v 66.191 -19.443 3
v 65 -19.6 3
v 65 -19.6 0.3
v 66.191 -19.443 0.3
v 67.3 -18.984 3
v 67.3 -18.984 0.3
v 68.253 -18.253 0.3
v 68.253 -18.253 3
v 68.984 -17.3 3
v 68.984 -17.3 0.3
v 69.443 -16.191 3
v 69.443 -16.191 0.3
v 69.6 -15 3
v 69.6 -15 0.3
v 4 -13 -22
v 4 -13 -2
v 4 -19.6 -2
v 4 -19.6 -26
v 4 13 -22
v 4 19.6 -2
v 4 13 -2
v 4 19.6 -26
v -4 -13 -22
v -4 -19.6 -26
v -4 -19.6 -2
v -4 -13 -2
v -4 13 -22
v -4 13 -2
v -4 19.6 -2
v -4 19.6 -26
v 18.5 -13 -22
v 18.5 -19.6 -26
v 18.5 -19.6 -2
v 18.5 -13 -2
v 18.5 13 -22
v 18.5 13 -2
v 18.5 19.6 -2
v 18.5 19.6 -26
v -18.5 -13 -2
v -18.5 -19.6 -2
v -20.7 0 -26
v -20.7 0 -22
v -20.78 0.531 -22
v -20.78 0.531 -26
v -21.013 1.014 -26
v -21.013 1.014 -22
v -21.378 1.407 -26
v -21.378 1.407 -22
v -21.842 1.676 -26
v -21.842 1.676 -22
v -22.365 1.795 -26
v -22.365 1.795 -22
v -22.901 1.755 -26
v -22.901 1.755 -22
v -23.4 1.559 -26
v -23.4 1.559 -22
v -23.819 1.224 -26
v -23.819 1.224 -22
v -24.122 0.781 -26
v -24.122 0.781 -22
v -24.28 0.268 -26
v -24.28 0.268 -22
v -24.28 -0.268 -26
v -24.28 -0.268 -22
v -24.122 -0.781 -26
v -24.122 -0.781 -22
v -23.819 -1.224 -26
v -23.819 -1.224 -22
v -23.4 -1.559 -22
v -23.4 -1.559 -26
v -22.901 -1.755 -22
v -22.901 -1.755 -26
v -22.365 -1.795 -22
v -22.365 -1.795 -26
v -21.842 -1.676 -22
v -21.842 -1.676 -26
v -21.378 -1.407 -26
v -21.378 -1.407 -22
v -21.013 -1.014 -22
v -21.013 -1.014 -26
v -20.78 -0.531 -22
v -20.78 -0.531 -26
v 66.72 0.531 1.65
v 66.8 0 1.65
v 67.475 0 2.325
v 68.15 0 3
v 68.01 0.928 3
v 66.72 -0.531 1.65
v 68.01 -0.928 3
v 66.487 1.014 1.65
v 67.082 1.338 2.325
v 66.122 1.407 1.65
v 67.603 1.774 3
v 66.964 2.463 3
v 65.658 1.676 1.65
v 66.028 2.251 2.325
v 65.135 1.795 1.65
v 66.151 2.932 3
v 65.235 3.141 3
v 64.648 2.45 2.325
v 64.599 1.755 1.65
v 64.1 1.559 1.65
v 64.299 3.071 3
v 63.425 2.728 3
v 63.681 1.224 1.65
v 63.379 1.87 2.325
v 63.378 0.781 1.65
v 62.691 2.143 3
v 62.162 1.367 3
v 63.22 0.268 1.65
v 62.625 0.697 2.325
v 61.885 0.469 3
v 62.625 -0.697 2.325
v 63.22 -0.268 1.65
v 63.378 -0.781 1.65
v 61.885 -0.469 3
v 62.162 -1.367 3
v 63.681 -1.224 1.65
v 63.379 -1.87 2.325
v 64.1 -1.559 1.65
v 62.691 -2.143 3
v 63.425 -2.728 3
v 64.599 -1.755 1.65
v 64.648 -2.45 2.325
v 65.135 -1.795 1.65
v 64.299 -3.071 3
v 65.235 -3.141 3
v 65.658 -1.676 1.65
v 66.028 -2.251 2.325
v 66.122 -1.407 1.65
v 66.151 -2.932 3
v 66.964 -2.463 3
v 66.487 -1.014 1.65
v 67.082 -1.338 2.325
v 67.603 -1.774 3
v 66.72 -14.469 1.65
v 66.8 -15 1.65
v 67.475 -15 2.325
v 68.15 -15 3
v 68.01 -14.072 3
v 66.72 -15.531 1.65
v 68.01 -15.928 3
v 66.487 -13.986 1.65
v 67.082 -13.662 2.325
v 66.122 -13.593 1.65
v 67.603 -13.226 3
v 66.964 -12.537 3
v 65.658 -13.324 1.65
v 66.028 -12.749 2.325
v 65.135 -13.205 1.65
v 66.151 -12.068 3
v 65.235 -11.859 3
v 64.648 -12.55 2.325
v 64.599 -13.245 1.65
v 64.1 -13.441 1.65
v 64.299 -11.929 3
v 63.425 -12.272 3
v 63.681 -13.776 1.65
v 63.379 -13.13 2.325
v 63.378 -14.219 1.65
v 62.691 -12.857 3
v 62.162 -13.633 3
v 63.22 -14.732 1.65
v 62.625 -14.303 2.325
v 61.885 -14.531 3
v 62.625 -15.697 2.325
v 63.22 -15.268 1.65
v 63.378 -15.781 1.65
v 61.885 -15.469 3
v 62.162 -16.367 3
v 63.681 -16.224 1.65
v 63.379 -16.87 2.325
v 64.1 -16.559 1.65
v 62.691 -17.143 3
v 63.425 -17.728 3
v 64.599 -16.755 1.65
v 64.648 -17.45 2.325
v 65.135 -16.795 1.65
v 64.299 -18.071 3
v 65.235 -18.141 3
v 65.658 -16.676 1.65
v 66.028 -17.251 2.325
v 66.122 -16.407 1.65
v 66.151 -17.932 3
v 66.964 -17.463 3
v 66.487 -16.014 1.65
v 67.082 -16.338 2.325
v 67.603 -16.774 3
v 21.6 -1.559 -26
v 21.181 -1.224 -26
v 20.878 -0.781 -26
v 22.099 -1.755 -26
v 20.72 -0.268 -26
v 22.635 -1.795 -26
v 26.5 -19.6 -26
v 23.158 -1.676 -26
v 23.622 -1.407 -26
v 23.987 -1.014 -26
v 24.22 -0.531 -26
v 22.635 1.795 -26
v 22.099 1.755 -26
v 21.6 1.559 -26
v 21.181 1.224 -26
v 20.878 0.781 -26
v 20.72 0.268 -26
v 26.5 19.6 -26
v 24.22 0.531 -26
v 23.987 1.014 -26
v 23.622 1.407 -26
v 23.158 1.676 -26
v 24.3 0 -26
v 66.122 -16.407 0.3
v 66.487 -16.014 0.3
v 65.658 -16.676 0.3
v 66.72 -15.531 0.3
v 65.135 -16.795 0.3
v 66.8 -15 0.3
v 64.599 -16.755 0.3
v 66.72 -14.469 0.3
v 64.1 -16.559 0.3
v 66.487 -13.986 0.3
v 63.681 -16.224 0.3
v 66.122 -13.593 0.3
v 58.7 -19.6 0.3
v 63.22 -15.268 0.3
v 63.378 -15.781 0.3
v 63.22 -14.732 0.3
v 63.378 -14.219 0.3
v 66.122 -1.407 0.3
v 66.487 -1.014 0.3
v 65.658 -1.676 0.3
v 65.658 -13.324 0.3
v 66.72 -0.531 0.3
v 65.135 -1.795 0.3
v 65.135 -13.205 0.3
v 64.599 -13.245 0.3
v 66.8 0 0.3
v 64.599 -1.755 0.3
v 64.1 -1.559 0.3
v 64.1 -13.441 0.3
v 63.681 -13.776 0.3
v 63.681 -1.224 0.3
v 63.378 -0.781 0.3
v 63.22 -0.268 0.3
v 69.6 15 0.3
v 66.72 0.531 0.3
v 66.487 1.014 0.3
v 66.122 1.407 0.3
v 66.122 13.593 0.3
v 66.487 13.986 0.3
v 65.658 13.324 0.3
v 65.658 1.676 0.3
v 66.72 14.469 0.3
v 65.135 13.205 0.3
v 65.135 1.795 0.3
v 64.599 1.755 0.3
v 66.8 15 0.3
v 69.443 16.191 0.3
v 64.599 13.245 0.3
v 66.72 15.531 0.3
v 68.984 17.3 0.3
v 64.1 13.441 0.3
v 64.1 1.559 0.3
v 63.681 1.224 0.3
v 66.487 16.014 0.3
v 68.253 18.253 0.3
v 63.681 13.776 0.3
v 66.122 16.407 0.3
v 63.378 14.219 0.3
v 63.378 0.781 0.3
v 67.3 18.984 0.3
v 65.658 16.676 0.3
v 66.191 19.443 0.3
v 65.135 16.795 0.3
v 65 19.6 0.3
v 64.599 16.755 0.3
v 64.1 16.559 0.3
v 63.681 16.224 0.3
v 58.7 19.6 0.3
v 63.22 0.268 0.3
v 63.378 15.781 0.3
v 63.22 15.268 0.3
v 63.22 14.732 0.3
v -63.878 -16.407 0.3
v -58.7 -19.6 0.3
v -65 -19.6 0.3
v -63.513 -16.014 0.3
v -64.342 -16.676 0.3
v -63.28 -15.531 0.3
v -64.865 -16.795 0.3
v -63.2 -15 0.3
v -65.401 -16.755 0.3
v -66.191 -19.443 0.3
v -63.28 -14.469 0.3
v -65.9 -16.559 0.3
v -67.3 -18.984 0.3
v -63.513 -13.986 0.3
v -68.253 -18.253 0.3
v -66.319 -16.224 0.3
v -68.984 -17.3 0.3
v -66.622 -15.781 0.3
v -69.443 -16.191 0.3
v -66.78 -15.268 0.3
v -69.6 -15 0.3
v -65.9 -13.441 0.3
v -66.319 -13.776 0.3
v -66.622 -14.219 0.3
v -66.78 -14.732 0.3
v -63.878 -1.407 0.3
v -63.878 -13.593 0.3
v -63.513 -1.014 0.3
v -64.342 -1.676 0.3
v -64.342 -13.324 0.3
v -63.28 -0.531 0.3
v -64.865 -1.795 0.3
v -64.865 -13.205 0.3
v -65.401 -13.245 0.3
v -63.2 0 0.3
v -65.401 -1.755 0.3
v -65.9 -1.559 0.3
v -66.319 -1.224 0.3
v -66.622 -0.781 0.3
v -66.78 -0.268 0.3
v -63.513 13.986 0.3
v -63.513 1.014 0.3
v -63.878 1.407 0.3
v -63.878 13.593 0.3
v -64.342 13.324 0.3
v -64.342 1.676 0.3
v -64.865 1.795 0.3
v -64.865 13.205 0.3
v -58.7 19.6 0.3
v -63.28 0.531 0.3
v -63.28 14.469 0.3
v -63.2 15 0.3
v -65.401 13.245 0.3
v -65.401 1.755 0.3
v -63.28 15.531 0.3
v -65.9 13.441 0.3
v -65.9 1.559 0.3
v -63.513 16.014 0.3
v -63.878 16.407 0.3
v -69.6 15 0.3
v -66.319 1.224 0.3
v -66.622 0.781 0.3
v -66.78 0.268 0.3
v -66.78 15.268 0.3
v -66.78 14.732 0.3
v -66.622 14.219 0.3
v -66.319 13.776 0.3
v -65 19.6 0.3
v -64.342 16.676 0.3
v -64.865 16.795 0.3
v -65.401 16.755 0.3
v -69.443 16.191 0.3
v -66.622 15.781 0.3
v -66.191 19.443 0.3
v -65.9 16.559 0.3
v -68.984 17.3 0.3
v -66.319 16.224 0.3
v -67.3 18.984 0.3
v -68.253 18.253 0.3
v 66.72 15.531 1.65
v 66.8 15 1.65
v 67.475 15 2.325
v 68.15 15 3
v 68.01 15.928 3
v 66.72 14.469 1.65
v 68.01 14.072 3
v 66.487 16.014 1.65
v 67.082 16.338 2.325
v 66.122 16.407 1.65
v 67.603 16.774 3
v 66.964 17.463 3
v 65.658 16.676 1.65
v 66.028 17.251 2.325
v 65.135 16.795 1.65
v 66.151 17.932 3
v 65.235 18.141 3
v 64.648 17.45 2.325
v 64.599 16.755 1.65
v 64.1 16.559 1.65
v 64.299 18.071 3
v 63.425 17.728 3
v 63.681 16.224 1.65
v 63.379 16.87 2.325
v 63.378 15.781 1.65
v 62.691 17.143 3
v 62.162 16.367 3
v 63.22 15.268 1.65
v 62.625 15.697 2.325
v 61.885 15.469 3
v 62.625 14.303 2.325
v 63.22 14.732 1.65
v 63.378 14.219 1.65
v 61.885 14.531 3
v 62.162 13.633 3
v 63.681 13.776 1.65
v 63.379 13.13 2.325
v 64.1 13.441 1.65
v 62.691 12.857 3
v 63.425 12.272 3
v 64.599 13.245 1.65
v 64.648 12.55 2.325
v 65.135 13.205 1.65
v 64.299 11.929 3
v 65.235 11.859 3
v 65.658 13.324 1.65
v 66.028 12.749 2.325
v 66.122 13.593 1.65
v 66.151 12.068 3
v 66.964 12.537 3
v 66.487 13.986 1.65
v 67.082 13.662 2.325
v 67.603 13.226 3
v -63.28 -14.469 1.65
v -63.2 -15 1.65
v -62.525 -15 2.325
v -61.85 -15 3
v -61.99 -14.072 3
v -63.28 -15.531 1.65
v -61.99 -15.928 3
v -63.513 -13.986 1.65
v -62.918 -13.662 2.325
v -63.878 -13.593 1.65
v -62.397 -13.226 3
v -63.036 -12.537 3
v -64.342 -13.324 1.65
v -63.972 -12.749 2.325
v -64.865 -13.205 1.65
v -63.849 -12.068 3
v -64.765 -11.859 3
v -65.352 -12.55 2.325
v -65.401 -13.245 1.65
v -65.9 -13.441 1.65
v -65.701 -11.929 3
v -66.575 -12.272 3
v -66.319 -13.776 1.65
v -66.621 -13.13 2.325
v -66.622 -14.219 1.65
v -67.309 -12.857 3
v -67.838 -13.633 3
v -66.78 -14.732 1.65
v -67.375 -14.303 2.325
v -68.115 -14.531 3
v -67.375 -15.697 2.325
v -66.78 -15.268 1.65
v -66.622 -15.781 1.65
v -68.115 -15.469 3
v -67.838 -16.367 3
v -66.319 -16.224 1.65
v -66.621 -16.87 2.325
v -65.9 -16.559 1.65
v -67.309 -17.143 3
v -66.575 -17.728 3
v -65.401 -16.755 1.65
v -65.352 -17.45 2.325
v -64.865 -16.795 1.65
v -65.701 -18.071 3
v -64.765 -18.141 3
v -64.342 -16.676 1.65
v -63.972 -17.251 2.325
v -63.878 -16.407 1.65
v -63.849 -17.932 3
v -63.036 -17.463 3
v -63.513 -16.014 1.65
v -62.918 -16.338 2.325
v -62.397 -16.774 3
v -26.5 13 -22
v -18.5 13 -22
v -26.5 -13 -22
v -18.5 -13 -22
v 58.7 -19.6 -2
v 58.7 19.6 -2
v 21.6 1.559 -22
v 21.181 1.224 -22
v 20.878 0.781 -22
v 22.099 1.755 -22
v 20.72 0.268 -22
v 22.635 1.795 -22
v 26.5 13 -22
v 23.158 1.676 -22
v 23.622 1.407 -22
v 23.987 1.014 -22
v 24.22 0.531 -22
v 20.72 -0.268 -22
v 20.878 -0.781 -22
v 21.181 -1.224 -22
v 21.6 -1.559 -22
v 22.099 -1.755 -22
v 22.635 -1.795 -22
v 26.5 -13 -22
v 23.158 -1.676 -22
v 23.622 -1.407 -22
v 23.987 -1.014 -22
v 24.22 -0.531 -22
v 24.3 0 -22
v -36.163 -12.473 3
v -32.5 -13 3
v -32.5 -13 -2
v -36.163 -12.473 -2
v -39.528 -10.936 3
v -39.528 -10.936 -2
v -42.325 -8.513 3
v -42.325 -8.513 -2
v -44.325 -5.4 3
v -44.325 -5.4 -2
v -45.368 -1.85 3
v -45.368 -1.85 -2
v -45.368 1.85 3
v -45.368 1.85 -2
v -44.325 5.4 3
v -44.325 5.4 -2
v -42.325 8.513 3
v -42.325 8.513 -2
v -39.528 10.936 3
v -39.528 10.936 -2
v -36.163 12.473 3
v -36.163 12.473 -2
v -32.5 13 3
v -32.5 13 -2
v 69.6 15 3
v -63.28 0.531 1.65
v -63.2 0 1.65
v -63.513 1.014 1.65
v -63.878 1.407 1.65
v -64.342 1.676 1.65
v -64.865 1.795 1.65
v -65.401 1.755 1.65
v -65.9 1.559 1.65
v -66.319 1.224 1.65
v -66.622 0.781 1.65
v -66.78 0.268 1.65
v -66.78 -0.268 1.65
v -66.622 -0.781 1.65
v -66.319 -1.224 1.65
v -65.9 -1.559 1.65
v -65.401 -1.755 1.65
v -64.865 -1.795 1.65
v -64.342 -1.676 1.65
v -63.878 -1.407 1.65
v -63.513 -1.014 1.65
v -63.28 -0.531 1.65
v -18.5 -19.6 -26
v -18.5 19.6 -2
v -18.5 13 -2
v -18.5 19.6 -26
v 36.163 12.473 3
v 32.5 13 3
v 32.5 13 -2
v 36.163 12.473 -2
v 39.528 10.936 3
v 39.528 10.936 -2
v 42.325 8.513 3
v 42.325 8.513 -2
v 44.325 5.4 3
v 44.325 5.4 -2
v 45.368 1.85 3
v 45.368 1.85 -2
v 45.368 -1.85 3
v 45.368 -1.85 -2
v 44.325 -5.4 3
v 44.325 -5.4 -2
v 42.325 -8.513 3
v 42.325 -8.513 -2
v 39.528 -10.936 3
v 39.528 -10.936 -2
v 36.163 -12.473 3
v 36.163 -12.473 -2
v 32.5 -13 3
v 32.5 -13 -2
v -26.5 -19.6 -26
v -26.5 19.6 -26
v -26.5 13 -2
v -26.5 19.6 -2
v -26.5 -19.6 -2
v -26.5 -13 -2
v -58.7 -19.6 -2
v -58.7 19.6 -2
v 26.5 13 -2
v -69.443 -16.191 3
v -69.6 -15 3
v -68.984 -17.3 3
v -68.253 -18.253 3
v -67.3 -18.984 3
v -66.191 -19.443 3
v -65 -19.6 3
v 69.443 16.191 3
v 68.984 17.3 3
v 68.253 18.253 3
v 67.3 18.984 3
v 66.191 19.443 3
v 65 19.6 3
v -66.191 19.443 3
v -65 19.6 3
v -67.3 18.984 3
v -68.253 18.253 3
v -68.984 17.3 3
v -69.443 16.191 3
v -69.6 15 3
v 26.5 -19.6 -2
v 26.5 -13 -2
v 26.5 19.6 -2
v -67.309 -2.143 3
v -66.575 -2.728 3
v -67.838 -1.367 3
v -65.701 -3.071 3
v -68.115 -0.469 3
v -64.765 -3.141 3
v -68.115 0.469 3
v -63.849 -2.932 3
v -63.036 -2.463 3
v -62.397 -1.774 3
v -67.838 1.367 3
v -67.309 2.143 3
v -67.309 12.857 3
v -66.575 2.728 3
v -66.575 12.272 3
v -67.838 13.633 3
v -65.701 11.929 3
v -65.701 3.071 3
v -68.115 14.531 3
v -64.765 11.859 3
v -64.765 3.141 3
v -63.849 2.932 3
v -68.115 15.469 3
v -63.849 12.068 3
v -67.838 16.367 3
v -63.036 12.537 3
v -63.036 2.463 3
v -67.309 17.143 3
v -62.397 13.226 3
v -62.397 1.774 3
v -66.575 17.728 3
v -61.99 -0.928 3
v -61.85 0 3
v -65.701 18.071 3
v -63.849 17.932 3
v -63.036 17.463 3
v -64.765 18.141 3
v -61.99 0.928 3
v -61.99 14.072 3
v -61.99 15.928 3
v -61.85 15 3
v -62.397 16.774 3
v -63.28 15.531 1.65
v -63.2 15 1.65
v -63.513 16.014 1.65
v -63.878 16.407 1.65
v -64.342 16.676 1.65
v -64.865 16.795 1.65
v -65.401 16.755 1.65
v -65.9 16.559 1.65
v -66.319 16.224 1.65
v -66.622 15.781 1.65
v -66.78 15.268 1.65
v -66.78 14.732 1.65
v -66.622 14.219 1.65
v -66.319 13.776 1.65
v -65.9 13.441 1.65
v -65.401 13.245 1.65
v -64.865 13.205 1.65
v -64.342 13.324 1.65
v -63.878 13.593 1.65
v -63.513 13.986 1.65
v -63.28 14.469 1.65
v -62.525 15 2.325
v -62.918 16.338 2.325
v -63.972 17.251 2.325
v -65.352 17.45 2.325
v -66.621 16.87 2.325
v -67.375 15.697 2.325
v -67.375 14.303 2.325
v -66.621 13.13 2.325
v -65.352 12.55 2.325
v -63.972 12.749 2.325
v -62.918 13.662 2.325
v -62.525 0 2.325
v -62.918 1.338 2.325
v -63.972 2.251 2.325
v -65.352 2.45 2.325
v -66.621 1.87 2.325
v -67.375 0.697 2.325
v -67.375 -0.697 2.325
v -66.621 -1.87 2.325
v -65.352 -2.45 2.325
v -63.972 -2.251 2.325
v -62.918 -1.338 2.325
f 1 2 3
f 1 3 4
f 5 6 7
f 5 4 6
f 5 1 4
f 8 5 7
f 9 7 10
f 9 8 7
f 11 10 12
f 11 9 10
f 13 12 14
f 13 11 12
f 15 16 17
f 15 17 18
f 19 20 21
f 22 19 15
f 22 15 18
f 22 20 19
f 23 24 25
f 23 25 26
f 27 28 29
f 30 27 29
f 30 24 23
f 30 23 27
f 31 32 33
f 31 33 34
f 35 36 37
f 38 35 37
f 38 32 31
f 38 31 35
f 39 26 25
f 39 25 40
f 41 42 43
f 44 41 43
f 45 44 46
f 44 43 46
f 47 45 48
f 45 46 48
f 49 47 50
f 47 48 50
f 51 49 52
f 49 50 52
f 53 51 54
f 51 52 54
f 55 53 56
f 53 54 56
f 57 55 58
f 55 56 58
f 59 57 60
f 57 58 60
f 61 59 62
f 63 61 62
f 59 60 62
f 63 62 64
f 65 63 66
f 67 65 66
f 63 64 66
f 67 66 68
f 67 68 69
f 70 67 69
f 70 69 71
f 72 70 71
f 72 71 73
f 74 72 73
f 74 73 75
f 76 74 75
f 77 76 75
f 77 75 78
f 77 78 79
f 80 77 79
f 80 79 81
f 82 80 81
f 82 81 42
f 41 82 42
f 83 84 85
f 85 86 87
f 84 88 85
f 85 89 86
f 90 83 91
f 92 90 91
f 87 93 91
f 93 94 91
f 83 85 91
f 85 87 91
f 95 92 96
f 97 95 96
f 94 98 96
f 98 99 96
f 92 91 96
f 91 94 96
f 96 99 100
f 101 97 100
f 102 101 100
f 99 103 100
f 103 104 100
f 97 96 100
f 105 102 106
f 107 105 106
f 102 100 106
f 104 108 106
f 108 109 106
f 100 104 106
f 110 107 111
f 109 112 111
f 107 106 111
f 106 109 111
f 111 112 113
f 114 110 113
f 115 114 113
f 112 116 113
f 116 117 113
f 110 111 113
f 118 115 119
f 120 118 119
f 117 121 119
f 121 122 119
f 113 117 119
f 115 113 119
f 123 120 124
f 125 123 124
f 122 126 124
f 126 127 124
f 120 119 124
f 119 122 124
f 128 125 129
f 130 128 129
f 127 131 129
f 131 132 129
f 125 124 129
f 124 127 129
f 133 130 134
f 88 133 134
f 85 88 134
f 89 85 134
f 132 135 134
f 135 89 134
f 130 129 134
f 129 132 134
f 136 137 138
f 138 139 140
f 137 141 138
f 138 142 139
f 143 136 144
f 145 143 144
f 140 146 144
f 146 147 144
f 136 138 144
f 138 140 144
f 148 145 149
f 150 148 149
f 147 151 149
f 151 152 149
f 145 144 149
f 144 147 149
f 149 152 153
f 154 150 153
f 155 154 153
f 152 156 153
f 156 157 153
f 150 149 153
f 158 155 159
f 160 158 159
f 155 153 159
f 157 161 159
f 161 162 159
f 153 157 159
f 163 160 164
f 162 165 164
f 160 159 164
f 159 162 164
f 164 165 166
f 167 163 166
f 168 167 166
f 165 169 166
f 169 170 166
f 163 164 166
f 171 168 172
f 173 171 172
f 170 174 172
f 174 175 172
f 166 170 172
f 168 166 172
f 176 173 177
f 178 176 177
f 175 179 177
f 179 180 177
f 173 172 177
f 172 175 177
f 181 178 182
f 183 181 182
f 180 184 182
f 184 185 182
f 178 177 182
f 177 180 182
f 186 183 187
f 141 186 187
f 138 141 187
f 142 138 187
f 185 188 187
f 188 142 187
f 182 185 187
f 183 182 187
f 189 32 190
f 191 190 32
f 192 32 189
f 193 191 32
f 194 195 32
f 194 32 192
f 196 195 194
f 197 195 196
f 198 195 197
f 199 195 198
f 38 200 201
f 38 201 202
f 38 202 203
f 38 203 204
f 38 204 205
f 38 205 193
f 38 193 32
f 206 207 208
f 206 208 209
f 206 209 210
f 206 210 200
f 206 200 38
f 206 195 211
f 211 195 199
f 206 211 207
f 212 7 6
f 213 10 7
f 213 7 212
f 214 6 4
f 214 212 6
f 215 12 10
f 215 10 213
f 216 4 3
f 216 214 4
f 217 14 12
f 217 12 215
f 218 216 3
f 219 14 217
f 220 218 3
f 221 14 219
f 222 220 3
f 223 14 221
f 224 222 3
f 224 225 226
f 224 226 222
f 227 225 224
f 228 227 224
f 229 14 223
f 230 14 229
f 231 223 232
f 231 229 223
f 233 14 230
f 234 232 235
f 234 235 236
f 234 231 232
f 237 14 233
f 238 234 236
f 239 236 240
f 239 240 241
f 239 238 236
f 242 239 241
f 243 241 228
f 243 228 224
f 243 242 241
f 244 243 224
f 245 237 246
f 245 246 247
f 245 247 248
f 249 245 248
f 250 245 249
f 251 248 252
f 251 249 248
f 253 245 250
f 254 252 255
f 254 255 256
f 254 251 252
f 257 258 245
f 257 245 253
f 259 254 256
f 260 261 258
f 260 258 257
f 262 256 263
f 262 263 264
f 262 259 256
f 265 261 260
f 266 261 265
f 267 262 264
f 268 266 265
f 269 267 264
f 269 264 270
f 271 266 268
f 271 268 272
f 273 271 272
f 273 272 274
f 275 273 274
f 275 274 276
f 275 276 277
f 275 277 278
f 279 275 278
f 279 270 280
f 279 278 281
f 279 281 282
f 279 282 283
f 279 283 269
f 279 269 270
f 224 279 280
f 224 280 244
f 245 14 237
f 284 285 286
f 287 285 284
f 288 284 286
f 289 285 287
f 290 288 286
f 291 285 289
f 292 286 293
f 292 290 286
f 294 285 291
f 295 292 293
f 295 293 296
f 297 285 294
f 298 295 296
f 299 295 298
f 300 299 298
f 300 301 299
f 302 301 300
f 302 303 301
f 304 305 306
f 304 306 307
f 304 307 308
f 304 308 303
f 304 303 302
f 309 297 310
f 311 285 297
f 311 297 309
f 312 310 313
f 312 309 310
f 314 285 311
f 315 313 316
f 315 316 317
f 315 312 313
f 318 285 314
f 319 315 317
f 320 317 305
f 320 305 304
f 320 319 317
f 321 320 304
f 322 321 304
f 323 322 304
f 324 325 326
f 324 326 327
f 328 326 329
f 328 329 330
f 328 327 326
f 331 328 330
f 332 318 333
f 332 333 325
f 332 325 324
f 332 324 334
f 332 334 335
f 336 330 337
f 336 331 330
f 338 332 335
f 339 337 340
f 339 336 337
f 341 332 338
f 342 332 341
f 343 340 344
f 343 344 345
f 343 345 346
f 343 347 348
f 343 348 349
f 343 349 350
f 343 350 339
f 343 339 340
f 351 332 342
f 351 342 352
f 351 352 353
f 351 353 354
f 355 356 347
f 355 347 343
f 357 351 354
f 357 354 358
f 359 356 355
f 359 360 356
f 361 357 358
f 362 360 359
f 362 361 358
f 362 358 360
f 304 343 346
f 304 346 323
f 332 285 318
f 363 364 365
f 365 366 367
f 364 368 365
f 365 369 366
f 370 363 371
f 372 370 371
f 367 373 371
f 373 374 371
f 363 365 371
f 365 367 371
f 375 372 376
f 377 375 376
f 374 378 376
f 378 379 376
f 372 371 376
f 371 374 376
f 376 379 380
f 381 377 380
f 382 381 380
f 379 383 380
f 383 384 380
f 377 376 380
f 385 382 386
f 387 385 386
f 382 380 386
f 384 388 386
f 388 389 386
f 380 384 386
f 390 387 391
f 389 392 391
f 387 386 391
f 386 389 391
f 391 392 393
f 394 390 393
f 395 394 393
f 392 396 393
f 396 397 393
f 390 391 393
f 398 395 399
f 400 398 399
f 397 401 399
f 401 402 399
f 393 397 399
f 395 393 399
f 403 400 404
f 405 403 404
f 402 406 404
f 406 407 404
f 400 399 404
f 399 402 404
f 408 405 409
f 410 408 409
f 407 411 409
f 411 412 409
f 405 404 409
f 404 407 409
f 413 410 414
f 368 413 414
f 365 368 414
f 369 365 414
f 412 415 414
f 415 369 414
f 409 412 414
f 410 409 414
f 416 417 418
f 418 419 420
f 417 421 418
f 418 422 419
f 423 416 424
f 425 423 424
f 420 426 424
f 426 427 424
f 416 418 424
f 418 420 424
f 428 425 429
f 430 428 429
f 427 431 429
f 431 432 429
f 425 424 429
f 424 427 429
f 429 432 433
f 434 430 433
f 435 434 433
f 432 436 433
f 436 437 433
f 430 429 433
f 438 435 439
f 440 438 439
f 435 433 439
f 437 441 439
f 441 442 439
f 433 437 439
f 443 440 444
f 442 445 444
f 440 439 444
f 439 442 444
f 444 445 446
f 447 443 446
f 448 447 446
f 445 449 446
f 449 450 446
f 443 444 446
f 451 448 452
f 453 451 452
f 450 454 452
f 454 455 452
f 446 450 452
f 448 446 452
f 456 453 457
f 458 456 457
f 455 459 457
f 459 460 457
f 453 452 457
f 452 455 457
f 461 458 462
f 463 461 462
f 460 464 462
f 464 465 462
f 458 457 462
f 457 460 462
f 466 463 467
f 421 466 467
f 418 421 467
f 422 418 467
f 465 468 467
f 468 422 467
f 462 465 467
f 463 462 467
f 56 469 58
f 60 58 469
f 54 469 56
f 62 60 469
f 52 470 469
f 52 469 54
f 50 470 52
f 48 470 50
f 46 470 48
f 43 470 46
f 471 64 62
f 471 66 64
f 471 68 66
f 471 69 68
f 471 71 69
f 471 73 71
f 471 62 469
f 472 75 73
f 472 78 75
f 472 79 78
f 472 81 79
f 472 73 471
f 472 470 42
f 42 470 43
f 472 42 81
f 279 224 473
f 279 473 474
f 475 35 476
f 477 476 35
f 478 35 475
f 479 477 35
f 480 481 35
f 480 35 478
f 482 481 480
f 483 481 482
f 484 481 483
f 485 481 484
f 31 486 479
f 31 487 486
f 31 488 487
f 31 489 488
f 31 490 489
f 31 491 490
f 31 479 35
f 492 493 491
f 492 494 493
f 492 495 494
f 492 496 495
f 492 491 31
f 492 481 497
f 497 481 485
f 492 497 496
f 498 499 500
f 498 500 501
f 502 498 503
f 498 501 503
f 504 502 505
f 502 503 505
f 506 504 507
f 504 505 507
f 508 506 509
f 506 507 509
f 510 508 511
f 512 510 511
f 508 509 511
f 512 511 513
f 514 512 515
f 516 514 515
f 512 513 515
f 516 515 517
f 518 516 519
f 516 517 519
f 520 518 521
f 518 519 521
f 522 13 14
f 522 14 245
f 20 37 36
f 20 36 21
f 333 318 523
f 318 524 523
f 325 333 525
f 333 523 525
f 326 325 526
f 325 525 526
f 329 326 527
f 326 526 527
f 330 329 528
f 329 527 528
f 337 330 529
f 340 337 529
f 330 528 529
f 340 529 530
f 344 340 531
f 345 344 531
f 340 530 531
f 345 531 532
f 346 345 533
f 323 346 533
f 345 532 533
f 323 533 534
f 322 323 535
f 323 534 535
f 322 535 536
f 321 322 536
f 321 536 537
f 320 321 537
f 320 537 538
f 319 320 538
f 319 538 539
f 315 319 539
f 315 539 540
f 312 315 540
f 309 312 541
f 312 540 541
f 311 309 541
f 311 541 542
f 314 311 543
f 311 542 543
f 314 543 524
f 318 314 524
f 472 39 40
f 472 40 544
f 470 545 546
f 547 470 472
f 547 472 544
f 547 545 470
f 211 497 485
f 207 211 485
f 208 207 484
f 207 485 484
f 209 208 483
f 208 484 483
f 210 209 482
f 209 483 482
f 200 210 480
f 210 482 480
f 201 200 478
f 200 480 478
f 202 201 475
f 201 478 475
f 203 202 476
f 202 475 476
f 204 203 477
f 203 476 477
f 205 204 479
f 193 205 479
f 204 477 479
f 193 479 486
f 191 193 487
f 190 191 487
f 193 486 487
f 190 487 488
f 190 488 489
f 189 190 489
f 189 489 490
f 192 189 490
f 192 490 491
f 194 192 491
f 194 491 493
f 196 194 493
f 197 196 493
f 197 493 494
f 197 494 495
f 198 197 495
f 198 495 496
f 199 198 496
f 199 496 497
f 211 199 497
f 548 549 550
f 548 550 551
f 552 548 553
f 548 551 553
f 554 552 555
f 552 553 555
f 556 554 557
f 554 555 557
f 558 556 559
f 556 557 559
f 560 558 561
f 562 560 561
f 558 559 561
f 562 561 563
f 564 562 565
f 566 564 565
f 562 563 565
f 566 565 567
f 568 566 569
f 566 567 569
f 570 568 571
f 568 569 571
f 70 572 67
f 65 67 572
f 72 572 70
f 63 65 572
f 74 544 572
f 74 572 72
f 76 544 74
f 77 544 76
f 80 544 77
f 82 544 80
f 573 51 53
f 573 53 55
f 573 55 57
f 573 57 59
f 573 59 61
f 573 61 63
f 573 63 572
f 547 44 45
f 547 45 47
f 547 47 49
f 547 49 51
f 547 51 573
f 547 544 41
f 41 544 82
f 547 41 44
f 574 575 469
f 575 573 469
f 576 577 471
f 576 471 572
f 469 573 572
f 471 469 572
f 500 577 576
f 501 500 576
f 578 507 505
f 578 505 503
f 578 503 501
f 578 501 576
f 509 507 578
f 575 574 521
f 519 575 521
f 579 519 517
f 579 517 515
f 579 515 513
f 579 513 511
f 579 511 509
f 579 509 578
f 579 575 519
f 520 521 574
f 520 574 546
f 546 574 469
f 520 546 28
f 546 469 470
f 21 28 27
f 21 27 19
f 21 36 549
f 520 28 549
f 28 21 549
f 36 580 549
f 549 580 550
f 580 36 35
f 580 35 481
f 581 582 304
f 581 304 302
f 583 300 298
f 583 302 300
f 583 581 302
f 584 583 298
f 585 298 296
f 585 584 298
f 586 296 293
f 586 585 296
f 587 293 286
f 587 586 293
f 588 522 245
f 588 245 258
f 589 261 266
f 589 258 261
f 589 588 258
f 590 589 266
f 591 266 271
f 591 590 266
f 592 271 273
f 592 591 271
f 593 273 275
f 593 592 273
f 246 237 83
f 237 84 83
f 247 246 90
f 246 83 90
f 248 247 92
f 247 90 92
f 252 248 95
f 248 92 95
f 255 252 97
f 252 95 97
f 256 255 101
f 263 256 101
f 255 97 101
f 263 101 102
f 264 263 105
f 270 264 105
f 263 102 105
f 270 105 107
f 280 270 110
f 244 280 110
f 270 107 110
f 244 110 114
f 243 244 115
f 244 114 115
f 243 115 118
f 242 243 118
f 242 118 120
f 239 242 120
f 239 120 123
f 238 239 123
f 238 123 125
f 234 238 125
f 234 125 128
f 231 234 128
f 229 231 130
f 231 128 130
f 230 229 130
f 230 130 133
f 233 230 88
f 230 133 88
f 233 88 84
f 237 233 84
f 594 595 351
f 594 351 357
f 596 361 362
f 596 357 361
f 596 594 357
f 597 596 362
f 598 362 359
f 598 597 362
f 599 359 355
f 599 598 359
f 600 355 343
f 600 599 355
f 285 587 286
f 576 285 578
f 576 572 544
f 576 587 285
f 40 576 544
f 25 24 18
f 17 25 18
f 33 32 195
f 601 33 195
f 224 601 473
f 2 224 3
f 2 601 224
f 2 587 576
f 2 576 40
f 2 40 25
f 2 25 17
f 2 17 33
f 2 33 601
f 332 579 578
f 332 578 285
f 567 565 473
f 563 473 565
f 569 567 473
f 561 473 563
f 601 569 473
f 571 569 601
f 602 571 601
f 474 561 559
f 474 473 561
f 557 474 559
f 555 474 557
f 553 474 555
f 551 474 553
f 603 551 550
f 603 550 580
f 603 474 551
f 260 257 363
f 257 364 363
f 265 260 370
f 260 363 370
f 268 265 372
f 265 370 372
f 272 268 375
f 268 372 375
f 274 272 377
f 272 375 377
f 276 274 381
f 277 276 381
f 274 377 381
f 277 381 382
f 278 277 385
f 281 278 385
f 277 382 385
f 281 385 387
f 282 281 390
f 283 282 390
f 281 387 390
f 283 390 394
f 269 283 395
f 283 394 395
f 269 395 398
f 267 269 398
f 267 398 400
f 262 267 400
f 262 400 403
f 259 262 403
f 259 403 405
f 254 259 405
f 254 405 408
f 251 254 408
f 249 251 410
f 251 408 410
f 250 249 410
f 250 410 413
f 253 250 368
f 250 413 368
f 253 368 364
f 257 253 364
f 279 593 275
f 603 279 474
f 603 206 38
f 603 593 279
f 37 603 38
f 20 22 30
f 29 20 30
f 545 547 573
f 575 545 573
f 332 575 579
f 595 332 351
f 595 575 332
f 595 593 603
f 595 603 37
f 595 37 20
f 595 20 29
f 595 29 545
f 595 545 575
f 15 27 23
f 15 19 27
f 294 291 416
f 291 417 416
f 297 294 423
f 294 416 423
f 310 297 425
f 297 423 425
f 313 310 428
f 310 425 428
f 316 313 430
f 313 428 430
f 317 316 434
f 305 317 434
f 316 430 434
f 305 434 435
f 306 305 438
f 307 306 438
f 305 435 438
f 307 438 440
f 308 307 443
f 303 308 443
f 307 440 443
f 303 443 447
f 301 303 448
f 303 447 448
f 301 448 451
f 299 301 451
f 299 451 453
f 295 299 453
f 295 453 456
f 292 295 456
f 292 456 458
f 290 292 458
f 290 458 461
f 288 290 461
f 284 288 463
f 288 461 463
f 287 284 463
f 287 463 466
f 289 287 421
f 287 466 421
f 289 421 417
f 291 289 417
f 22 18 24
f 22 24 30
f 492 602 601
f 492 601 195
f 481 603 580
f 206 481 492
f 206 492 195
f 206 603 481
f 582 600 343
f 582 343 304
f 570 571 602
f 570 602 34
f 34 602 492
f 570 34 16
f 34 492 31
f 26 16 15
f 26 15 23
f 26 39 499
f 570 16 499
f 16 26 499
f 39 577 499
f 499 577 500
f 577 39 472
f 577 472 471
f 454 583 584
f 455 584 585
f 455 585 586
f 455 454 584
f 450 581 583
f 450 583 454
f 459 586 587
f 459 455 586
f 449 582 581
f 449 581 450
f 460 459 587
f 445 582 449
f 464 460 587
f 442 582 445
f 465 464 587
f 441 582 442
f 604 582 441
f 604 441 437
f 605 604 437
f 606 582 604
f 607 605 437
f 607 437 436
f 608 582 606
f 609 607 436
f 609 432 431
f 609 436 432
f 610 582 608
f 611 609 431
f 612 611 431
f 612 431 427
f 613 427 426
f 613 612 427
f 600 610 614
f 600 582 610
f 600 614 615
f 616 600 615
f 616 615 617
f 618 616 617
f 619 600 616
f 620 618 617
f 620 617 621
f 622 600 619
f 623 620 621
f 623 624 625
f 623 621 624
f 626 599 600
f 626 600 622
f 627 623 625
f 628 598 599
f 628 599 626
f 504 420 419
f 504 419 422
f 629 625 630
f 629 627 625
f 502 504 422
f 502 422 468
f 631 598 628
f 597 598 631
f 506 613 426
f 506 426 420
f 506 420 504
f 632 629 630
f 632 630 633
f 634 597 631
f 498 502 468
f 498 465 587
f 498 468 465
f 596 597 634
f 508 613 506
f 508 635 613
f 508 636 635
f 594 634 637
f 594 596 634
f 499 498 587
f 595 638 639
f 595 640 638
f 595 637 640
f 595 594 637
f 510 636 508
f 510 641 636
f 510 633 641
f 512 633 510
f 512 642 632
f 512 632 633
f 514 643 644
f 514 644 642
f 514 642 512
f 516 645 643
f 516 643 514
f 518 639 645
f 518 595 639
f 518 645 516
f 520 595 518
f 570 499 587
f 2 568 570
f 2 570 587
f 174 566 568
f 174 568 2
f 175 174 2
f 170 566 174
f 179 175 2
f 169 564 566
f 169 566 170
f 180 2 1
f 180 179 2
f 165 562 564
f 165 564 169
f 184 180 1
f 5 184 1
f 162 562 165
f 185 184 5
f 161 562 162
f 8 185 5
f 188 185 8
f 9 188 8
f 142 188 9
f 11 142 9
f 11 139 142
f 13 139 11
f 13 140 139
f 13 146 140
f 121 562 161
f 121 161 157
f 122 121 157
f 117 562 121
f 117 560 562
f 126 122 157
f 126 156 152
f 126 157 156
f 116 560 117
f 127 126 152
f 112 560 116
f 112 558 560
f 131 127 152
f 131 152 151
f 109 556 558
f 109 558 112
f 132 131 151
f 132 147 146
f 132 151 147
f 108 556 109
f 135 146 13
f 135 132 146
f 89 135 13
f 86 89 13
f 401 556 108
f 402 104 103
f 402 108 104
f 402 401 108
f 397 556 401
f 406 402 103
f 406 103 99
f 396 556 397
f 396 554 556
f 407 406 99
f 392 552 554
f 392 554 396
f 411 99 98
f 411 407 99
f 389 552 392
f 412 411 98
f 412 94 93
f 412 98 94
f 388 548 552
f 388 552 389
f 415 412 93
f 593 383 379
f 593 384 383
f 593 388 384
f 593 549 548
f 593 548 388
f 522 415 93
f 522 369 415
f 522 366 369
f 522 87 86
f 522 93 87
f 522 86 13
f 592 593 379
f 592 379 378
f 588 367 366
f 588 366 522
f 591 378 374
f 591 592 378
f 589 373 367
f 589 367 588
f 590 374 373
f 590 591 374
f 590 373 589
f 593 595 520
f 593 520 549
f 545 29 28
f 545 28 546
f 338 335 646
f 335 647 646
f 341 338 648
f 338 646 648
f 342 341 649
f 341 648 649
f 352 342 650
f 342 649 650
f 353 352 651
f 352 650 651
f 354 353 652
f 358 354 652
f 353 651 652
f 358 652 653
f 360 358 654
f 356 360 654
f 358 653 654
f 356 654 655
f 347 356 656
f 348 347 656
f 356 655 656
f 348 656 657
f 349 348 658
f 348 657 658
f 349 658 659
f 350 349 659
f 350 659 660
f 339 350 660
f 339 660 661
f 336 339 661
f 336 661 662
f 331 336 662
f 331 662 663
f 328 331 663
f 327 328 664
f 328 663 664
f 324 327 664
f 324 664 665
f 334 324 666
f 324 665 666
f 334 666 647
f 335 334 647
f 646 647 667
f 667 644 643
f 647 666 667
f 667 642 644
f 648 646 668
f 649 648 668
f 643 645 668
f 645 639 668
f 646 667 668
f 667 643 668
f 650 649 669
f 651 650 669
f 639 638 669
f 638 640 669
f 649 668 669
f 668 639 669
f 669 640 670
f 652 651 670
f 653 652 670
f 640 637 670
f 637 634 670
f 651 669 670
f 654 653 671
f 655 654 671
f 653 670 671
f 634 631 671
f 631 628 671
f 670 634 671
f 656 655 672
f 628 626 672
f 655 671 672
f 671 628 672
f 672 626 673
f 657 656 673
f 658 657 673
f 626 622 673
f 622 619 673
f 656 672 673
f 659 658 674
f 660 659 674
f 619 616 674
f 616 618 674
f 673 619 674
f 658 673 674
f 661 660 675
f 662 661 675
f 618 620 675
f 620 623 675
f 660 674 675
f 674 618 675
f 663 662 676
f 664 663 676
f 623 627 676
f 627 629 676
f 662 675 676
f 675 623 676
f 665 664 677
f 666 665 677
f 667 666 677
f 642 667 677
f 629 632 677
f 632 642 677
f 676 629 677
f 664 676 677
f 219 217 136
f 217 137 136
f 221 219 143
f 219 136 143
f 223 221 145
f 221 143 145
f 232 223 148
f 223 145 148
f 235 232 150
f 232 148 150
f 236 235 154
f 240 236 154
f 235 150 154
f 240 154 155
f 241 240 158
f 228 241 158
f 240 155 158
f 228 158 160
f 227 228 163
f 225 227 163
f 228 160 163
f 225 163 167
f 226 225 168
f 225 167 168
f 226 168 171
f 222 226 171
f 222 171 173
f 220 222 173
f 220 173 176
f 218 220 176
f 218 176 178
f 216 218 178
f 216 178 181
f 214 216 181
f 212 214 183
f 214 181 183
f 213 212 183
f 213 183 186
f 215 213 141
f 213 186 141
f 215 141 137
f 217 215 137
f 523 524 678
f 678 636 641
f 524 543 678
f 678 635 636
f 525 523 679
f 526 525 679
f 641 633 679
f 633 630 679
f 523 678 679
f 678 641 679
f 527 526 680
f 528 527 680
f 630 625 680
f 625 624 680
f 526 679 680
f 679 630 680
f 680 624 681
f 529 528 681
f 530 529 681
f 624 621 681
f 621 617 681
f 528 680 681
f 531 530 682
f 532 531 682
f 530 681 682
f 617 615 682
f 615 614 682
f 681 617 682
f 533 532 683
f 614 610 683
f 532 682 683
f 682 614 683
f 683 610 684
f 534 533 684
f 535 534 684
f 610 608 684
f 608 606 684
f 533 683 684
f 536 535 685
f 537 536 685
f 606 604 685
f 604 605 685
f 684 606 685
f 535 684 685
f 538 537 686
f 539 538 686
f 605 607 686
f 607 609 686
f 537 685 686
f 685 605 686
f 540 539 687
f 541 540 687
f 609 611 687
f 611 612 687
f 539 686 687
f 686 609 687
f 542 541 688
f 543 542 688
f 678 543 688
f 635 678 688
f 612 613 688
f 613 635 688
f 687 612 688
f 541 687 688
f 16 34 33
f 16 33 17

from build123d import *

# Parameters (mm, degrees)
SKETCH1_W                = 118
SKETCH1_H                = 40
SKETCH1_W_2              = 11
BOSS_EXTRUDE1_DEPTH      = 3
BOSS_EXTRUDE2_START      = -5
SKETCH1_3_W              = 118
SKETCH1_3_H              = 40
BOSS_EXTRUDE2_DEPTH      = 5
FILLET1_R                = 5
BOSS_EXTRUDE3_DEPTH      = 4
LPATTERN1_COUNT          = 2
LPATTERN1_PITCH          = 22.5
LPATTERN1_COL_COUNT      = 2
LPATTERN1_COL_PITCH      = 22.5
M3_CLEARANCE_HOLE1_D     = 3.6
M3_CLEARANCE_HOLE1_DEPTH = 9
M3_CLEARANCE_HOLE1_TIP   = 1.081549114
CUT_EXTRUDE2_DEPTH       = 79.364532794
SKETCH12_W               = 5
SKETCH12_H               = 39.2
CUT_EXTRUDE3_DEPTH       = 0.3
SKETCH13_W               = 5
SKETCH13_H               = 39.2
CUT_EXTRUDE4_DEPTH       = 0.3
CUT_EXTRUDE5_START       = -0.3
CUT_EXTRUDE5_DEPTH       = 0.3
SKETCH16_W               = 14.5
SKETCH16_H               = 6.6
CUT_EXTRUDE7_DEPTH       = 3


# Read off the part's stored shape, not the designer's step: CSK for M3 Flat Head Machine Screw1
with BuildPart() as part:
    # Sketch1 → Boss-Extrude1 (new body)
    # profile 1 of 3: a face of its own
    with BuildSketch(Plane.XY):
        Rectangle(SKETCH1_W, SKETCH1_H)
        with BuildLine():
            ThreePointArc((-32.5, -13), (-45.5, 0), (-32.5, 13))
            Line((-32.5, 13), (32.5, 13))
            ThreePointArc((32.5, 13), (45.5, 0), (32.5, -13))
            Line((32.5, -13), (-32.5, -13))
        make_face(mode=Mode.SUBTRACT)
    # profile 2 of 3: a face of its own
    with BuildSketch(Plane.XY):
        with Locations((-64.5, 0)):
            Rectangle(SKETCH1_W_2, SKETCH1_H)
    # profile 3 of 3: a face of its own
    with BuildSketch(Plane.XY):
        with Locations((64.5, 0)):
            Rectangle(SKETCH1_W_2, SKETCH1_H)
    extrude(amount=BOSS_EXTRUDE1_DEPTH)

    # Sketch1<3> → Boss-Extrude2 (add)
    with BuildSketch(Plane.XY.offset(BOSS_EXTRUDE2_START)):
        Rectangle(SKETCH1_3_W, SKETCH1_3_H)
        with BuildLine():
            ThreePointArc((-32.5, -13), (-45.5, 0), (-32.5, 13))
            Line((-32.5, 13), (32.5, 13))
            ThreePointArc((32.5, 13), (45.5, 0), (32.5, -13))
            Line((32.5, -13), (-32.5, -13))
        make_face(mode=Mode.SUBTRACT)
    extrude(amount=BOSS_EXTRUDE2_DEPTH)

    # CSK for M3 Flat Head Machine Screw1 outl → CSK for M3 Flat Head Machine Screw1 (revolve, cut)
    with BuildSketch(Plane(origin=(65, 0, 0), x_dir=(1, 0, 0), z_dir=(0, -1, 0))):
        Polygon((0, 0), (1.8, 0), (1.8, 1.65), (3.15, 3), (0, 3), align=None)
    revolve(axis=Axis((65, 0, 0), (0, 0, 1)), mode=Mode.SUBTRACT)

    # CSK for M3 Flat Head Machine Screw1 2 ou → CSK for M3 Flat Head Machine Screw1 2 (revolve, cut)
    with BuildSketch(Plane(origin=(-65, 0, 0), x_dir=(1, 0, 0), z_dir=(0, -1, 0))):
        Polygon((0, 0), (1.8, 0), (1.8, 1.65), (3.15, 3), (0, 3), align=None)
    revolve(axis=Axis((-65, 0, 0), (0, 0, 1)), mode=Mode.SUBTRACT)

    # CSK for M3 Flat Head Machine Screw1 3 ou → CSK for M3 Flat Head Machine Screw1 3 (revolve, cut)
    with BuildSketch(Plane(origin=(-65, -15, 0), x_dir=(1, 0, 0), z_dir=(0, -1, 0))):
        Polygon((0, 0), (1.8, 0), (1.8, 1.65), (3.15, 3), (0, 3), align=None)
    revolve(axis=Axis((-65, -15, 0), (0, 0, 1)), mode=Mode.SUBTRACT)

    # CSK for M3 Flat Head Machine Screw1 4 ou → CSK for M3 Flat Head Machine Screw1 4 (revolve, cut)
    with BuildSketch(Plane(origin=(65, 15, 0), x_dir=(1, 0, 0), z_dir=(0, -1, 0))):
        Polygon((0, 0), (1.8, 0), (1.8, 1.65), (3.15, 3), (0, 3), align=None)
    revolve(axis=Axis((65, 15, 0), (0, 0, 1)), mode=Mode.SUBTRACT)

    # CSK for M3 Flat Head Machine Screw1 5 ou → CSK for M3 Flat Head Machine Screw1 5 (revolve, cut)
    with BuildSketch(Plane(origin=(65, -15, 0), x_dir=(1, 0, 0), z_dir=(0, -1, 0))):
        Polygon((0, 0), (1.8, 0), (1.8, 1.65), (3.15, 3), (0, 3), align=None)
    revolve(axis=Axis((65, -15, 0), (0, 0, 1)), mode=Mode.SUBTRACT)

    # CSK for M3 Flat Head Machine Screw1 6 ou → CSK for M3 Flat Head Machine Screw1 6 (revolve, cut)
    with BuildSketch(Plane(origin=(-65, 15, 0), x_dir=(1, 0, 0), z_dir=(0, -1, 0))):
        Polygon((0, 0), (1.8, 0), (1.8, 1.65), (3.15, 3), (0, 3), align=None)
    revolve(axis=Axis((-65, 15, 0), (0, 0, 1)), mode=Mode.SUBTRACT)

    # Fillet1
    fillet1_edges = [part.edges().sort_by_distance(p)[0] for p in [
        (-70, -20, 1.5),
        (-70, 20, 1.5),
        (70, 20, 1.5),
        (70, -20, 1.5),
    ]]
    fillet(fillet1_edges, radius=FILLET1_R)

    # Sketch5 → Boss-Extrude3 (add, symmetric)
    with BuildSketch(Plane(origin=(0, 0, 0), x_dir=(0, 0, -1), z_dir=(1, 0, 0))):
        Polygon((5, -13), (5, -20), (26, -20), (26, 20), (5, 20), (5, 13), (22, 13), (22, -13), align=None)
    boss_extrude3 = extrude(amount=BOSS_EXTRUDE3_DEPTH, both=True)

    # LPattern1: Boss-Extrude3 ×2
    with Locations(*[(i * LPATTERN1_PITCH, 0, 0) for i in range(1, LPATTERN1_COUNT)]):
        add(boss_extrude3)

    # LPattern1 col: Boss-Extrude3 ×2
    with Locations(*[(-i * LPATTERN1_COL_PITCH, 0, 0) for i in range(1, LPATTERN1_COL_COUNT)]):
        add(boss_extrude3)

    # M3 Clearance Hole1
    with Locations(Plane(origin=(0, 0, -26), x_dir=(-1, 0, 0), z_dir=(0, 0, -1))):
        with Locations((-22.5, 0), (22.5, 0)):
            Hole(M3_CLEARANCE_HOLE1_D / 2, depth=M3_CLEARANCE_HOLE1_DEPTH)
            with Locations((0, 0, -(M3_CLEARANCE_HOLE1_DEPTH + M3_CLEARANCE_HOLE1_TIP / 2))):  # 118° drill point
                Cone(0, M3_CLEARANCE_HOLE1_D / 2, M3_CLEARANCE_HOLE1_TIP, mode=Mode.SUBTRACT)

    # Sketch10 → Cut-Extrude2 (cut, through all)
    with BuildSketch(Plane.XY.offset(3)):
        with BuildLine():
            Line((70, -15), (70, 15))
            ThreePointArc((70, 15), (68.535533906, 18.535533906), (65, 20))
            Line((65, 20), (-65, 20))
            ThreePointArc((-65, 20), (-68.535533906, 18.535533906), (-70, 15))
            Line((-70, 15), (-70, -15))
            ThreePointArc((-70, -15), (-68.535533906, -18.535533906), (-65, -20))
            Line((-65, -20), (65, -20))
            ThreePointArc((65, -20), (68.535533906, -18.535533906), (70, -15))
        make_face()
        with BuildLine():
            Line((69.6, -15), (69.6, 15))
            ThreePointArc((69.6, 15), (68.252691193, 18.252691193), (65, 19.6))
            Line((65, 19.6), (-65, 19.6))
            ThreePointArc((-65, 19.6), (-68.252691193, 18.252691193), (-69.6, 15))
            Line((-69.6, 15), (-69.6, -15))
            ThreePointArc((-69.6, -15), (-68.252691193, -18.252691193), (-65, -19.6))
            Line((-65, -19.6), (65, -19.6))
            ThreePointArc((65, -19.6), (68.252691193, -18.252691193), (69.6, -15))
        make_face(mode=Mode.SUBTRACT)
    extrude(amount=-CUT_EXTRUDE2_DEPTH, mode=Mode.SUBTRACT)

    # Sketch12 → Cut-Extrude3 (cut)
    with BuildSketch(Plane(origin=(59, 0, 0), x_dir=(0, 0, -1), z_dir=(1, 0, 0))):
        with Locations((2.5, 0)):
            Rectangle(SKETCH12_W, SKETCH12_H)
    extrude(amount=-CUT_EXTRUDE3_DEPTH, mode=Mode.SUBTRACT)

    # Sketch13 → Cut-Extrude4 (cut)
    with BuildSketch(Plane.ZY.offset(59)):
        with Locations((-2.5, 0)):
            Rectangle(SKETCH13_W, SKETCH13_H)
    extrude(amount=-CUT_EXTRUDE4_DEPTH, mode=Mode.SUBTRACT)

    # Sketch14 → Cut-Extrude5 (cut)
    with BuildSketch(Plane(origin=(0, 0, 0), x_dir=(-1, 0, 0), z_dir=(0, 0, -1)).offset(CUT_EXTRUDE5_START)):
        with BuildLine():
            Line((-65, -19.6), (-58.7, -19.6))
            Line((-58.7, -19.6), (-58.7, 19.6))
            Line((-58.7, 19.6), (-65, 19.6))
            ThreePointArc((-65, 19.6), (-68.252691193, 18.252691193), (-69.6, 15))
            Line((-69.6, 15), (-69.6, -15))
            ThreePointArc((-69.6, -15), (-68.252691193, -18.252691193), (-65, -19.6))
        make_face()
        with BuildLine():
            Line((58.7, -19.6), (65, -19.6))
            ThreePointArc((65, -19.6), (68.252691193, -18.252691193), (69.6, -15))
            Line((69.6, -15), (69.6, 15))
            ThreePointArc((69.6, 15), (68.252691193, 18.252691193), (65, 19.6))
            Line((65, 19.6), (58.7, 19.6))
            Line((58.7, 19.6), (58.7, -19.6))
        make_face()
    extrude(amount=CUT_EXTRUDE5_DEPTH, mode=Mode.SUBTRACT)

    # Sketch16 → Cut-Extrude7 (cut)
    with BuildSketch(Plane(origin=(0, 0, -5), x_dir=(-1, 0, 0), z_dir=(0, 0, -1))):
        with Locations((11.25, 16.3)):
            Rectangle(SKETCH16_W, SKETCH16_H)
        with BuildLine():
            Line((58.7, -19.6), (58.7, 19.6))
            Line((58.7, 19.6), (26.5, 19.6))
            Line((26.5, 19.6), (26.5, 13))
            Line((26.5, 13), (32.5, 13))
            ThreePointArc((32.5, 13), (45.5, 0), (32.5, -13))
            Line((32.5, -13), (26.5, -13))
            Line((26.5, -13), (26.5, -19.6))
            Line((26.5, -19.6), (58.7, -19.6))
        make_face()
        with Locations((11.25, -16.3)):
            Rectangle(SKETCH16_W, SKETCH16_H)
        with Locations((-11.25, -16.3)):
            Rectangle(SKETCH16_W, SKETCH16_H)
        with Locations((-11.25, 16.3)):
            Rectangle(SKETCH16_W, SKETCH16_H)
        with BuildLine():
            Line((-58.7, 19.6), (-58.7, -19.6))
            Line((-58.7, -19.6), (-26.5, -19.6))
            Line((-26.5, -19.6), (-26.5, -13))
            Line((-26.5, -13), (-32.5, -13))
            ThreePointArc((-32.5, -13), (-45.5, 0), (-32.5, 13))
            Line((-32.5, 13), (-26.5, 13))
            Line((-26.5, 13), (-26.5, 19.6))
            Line((-26.5, 19.6), (-58.7, 19.6))
        make_face()
    extrude(amount=-CUT_EXTRUDE7_DEPTH, mode=Mode.SUBTRACT)


solid = part.part
